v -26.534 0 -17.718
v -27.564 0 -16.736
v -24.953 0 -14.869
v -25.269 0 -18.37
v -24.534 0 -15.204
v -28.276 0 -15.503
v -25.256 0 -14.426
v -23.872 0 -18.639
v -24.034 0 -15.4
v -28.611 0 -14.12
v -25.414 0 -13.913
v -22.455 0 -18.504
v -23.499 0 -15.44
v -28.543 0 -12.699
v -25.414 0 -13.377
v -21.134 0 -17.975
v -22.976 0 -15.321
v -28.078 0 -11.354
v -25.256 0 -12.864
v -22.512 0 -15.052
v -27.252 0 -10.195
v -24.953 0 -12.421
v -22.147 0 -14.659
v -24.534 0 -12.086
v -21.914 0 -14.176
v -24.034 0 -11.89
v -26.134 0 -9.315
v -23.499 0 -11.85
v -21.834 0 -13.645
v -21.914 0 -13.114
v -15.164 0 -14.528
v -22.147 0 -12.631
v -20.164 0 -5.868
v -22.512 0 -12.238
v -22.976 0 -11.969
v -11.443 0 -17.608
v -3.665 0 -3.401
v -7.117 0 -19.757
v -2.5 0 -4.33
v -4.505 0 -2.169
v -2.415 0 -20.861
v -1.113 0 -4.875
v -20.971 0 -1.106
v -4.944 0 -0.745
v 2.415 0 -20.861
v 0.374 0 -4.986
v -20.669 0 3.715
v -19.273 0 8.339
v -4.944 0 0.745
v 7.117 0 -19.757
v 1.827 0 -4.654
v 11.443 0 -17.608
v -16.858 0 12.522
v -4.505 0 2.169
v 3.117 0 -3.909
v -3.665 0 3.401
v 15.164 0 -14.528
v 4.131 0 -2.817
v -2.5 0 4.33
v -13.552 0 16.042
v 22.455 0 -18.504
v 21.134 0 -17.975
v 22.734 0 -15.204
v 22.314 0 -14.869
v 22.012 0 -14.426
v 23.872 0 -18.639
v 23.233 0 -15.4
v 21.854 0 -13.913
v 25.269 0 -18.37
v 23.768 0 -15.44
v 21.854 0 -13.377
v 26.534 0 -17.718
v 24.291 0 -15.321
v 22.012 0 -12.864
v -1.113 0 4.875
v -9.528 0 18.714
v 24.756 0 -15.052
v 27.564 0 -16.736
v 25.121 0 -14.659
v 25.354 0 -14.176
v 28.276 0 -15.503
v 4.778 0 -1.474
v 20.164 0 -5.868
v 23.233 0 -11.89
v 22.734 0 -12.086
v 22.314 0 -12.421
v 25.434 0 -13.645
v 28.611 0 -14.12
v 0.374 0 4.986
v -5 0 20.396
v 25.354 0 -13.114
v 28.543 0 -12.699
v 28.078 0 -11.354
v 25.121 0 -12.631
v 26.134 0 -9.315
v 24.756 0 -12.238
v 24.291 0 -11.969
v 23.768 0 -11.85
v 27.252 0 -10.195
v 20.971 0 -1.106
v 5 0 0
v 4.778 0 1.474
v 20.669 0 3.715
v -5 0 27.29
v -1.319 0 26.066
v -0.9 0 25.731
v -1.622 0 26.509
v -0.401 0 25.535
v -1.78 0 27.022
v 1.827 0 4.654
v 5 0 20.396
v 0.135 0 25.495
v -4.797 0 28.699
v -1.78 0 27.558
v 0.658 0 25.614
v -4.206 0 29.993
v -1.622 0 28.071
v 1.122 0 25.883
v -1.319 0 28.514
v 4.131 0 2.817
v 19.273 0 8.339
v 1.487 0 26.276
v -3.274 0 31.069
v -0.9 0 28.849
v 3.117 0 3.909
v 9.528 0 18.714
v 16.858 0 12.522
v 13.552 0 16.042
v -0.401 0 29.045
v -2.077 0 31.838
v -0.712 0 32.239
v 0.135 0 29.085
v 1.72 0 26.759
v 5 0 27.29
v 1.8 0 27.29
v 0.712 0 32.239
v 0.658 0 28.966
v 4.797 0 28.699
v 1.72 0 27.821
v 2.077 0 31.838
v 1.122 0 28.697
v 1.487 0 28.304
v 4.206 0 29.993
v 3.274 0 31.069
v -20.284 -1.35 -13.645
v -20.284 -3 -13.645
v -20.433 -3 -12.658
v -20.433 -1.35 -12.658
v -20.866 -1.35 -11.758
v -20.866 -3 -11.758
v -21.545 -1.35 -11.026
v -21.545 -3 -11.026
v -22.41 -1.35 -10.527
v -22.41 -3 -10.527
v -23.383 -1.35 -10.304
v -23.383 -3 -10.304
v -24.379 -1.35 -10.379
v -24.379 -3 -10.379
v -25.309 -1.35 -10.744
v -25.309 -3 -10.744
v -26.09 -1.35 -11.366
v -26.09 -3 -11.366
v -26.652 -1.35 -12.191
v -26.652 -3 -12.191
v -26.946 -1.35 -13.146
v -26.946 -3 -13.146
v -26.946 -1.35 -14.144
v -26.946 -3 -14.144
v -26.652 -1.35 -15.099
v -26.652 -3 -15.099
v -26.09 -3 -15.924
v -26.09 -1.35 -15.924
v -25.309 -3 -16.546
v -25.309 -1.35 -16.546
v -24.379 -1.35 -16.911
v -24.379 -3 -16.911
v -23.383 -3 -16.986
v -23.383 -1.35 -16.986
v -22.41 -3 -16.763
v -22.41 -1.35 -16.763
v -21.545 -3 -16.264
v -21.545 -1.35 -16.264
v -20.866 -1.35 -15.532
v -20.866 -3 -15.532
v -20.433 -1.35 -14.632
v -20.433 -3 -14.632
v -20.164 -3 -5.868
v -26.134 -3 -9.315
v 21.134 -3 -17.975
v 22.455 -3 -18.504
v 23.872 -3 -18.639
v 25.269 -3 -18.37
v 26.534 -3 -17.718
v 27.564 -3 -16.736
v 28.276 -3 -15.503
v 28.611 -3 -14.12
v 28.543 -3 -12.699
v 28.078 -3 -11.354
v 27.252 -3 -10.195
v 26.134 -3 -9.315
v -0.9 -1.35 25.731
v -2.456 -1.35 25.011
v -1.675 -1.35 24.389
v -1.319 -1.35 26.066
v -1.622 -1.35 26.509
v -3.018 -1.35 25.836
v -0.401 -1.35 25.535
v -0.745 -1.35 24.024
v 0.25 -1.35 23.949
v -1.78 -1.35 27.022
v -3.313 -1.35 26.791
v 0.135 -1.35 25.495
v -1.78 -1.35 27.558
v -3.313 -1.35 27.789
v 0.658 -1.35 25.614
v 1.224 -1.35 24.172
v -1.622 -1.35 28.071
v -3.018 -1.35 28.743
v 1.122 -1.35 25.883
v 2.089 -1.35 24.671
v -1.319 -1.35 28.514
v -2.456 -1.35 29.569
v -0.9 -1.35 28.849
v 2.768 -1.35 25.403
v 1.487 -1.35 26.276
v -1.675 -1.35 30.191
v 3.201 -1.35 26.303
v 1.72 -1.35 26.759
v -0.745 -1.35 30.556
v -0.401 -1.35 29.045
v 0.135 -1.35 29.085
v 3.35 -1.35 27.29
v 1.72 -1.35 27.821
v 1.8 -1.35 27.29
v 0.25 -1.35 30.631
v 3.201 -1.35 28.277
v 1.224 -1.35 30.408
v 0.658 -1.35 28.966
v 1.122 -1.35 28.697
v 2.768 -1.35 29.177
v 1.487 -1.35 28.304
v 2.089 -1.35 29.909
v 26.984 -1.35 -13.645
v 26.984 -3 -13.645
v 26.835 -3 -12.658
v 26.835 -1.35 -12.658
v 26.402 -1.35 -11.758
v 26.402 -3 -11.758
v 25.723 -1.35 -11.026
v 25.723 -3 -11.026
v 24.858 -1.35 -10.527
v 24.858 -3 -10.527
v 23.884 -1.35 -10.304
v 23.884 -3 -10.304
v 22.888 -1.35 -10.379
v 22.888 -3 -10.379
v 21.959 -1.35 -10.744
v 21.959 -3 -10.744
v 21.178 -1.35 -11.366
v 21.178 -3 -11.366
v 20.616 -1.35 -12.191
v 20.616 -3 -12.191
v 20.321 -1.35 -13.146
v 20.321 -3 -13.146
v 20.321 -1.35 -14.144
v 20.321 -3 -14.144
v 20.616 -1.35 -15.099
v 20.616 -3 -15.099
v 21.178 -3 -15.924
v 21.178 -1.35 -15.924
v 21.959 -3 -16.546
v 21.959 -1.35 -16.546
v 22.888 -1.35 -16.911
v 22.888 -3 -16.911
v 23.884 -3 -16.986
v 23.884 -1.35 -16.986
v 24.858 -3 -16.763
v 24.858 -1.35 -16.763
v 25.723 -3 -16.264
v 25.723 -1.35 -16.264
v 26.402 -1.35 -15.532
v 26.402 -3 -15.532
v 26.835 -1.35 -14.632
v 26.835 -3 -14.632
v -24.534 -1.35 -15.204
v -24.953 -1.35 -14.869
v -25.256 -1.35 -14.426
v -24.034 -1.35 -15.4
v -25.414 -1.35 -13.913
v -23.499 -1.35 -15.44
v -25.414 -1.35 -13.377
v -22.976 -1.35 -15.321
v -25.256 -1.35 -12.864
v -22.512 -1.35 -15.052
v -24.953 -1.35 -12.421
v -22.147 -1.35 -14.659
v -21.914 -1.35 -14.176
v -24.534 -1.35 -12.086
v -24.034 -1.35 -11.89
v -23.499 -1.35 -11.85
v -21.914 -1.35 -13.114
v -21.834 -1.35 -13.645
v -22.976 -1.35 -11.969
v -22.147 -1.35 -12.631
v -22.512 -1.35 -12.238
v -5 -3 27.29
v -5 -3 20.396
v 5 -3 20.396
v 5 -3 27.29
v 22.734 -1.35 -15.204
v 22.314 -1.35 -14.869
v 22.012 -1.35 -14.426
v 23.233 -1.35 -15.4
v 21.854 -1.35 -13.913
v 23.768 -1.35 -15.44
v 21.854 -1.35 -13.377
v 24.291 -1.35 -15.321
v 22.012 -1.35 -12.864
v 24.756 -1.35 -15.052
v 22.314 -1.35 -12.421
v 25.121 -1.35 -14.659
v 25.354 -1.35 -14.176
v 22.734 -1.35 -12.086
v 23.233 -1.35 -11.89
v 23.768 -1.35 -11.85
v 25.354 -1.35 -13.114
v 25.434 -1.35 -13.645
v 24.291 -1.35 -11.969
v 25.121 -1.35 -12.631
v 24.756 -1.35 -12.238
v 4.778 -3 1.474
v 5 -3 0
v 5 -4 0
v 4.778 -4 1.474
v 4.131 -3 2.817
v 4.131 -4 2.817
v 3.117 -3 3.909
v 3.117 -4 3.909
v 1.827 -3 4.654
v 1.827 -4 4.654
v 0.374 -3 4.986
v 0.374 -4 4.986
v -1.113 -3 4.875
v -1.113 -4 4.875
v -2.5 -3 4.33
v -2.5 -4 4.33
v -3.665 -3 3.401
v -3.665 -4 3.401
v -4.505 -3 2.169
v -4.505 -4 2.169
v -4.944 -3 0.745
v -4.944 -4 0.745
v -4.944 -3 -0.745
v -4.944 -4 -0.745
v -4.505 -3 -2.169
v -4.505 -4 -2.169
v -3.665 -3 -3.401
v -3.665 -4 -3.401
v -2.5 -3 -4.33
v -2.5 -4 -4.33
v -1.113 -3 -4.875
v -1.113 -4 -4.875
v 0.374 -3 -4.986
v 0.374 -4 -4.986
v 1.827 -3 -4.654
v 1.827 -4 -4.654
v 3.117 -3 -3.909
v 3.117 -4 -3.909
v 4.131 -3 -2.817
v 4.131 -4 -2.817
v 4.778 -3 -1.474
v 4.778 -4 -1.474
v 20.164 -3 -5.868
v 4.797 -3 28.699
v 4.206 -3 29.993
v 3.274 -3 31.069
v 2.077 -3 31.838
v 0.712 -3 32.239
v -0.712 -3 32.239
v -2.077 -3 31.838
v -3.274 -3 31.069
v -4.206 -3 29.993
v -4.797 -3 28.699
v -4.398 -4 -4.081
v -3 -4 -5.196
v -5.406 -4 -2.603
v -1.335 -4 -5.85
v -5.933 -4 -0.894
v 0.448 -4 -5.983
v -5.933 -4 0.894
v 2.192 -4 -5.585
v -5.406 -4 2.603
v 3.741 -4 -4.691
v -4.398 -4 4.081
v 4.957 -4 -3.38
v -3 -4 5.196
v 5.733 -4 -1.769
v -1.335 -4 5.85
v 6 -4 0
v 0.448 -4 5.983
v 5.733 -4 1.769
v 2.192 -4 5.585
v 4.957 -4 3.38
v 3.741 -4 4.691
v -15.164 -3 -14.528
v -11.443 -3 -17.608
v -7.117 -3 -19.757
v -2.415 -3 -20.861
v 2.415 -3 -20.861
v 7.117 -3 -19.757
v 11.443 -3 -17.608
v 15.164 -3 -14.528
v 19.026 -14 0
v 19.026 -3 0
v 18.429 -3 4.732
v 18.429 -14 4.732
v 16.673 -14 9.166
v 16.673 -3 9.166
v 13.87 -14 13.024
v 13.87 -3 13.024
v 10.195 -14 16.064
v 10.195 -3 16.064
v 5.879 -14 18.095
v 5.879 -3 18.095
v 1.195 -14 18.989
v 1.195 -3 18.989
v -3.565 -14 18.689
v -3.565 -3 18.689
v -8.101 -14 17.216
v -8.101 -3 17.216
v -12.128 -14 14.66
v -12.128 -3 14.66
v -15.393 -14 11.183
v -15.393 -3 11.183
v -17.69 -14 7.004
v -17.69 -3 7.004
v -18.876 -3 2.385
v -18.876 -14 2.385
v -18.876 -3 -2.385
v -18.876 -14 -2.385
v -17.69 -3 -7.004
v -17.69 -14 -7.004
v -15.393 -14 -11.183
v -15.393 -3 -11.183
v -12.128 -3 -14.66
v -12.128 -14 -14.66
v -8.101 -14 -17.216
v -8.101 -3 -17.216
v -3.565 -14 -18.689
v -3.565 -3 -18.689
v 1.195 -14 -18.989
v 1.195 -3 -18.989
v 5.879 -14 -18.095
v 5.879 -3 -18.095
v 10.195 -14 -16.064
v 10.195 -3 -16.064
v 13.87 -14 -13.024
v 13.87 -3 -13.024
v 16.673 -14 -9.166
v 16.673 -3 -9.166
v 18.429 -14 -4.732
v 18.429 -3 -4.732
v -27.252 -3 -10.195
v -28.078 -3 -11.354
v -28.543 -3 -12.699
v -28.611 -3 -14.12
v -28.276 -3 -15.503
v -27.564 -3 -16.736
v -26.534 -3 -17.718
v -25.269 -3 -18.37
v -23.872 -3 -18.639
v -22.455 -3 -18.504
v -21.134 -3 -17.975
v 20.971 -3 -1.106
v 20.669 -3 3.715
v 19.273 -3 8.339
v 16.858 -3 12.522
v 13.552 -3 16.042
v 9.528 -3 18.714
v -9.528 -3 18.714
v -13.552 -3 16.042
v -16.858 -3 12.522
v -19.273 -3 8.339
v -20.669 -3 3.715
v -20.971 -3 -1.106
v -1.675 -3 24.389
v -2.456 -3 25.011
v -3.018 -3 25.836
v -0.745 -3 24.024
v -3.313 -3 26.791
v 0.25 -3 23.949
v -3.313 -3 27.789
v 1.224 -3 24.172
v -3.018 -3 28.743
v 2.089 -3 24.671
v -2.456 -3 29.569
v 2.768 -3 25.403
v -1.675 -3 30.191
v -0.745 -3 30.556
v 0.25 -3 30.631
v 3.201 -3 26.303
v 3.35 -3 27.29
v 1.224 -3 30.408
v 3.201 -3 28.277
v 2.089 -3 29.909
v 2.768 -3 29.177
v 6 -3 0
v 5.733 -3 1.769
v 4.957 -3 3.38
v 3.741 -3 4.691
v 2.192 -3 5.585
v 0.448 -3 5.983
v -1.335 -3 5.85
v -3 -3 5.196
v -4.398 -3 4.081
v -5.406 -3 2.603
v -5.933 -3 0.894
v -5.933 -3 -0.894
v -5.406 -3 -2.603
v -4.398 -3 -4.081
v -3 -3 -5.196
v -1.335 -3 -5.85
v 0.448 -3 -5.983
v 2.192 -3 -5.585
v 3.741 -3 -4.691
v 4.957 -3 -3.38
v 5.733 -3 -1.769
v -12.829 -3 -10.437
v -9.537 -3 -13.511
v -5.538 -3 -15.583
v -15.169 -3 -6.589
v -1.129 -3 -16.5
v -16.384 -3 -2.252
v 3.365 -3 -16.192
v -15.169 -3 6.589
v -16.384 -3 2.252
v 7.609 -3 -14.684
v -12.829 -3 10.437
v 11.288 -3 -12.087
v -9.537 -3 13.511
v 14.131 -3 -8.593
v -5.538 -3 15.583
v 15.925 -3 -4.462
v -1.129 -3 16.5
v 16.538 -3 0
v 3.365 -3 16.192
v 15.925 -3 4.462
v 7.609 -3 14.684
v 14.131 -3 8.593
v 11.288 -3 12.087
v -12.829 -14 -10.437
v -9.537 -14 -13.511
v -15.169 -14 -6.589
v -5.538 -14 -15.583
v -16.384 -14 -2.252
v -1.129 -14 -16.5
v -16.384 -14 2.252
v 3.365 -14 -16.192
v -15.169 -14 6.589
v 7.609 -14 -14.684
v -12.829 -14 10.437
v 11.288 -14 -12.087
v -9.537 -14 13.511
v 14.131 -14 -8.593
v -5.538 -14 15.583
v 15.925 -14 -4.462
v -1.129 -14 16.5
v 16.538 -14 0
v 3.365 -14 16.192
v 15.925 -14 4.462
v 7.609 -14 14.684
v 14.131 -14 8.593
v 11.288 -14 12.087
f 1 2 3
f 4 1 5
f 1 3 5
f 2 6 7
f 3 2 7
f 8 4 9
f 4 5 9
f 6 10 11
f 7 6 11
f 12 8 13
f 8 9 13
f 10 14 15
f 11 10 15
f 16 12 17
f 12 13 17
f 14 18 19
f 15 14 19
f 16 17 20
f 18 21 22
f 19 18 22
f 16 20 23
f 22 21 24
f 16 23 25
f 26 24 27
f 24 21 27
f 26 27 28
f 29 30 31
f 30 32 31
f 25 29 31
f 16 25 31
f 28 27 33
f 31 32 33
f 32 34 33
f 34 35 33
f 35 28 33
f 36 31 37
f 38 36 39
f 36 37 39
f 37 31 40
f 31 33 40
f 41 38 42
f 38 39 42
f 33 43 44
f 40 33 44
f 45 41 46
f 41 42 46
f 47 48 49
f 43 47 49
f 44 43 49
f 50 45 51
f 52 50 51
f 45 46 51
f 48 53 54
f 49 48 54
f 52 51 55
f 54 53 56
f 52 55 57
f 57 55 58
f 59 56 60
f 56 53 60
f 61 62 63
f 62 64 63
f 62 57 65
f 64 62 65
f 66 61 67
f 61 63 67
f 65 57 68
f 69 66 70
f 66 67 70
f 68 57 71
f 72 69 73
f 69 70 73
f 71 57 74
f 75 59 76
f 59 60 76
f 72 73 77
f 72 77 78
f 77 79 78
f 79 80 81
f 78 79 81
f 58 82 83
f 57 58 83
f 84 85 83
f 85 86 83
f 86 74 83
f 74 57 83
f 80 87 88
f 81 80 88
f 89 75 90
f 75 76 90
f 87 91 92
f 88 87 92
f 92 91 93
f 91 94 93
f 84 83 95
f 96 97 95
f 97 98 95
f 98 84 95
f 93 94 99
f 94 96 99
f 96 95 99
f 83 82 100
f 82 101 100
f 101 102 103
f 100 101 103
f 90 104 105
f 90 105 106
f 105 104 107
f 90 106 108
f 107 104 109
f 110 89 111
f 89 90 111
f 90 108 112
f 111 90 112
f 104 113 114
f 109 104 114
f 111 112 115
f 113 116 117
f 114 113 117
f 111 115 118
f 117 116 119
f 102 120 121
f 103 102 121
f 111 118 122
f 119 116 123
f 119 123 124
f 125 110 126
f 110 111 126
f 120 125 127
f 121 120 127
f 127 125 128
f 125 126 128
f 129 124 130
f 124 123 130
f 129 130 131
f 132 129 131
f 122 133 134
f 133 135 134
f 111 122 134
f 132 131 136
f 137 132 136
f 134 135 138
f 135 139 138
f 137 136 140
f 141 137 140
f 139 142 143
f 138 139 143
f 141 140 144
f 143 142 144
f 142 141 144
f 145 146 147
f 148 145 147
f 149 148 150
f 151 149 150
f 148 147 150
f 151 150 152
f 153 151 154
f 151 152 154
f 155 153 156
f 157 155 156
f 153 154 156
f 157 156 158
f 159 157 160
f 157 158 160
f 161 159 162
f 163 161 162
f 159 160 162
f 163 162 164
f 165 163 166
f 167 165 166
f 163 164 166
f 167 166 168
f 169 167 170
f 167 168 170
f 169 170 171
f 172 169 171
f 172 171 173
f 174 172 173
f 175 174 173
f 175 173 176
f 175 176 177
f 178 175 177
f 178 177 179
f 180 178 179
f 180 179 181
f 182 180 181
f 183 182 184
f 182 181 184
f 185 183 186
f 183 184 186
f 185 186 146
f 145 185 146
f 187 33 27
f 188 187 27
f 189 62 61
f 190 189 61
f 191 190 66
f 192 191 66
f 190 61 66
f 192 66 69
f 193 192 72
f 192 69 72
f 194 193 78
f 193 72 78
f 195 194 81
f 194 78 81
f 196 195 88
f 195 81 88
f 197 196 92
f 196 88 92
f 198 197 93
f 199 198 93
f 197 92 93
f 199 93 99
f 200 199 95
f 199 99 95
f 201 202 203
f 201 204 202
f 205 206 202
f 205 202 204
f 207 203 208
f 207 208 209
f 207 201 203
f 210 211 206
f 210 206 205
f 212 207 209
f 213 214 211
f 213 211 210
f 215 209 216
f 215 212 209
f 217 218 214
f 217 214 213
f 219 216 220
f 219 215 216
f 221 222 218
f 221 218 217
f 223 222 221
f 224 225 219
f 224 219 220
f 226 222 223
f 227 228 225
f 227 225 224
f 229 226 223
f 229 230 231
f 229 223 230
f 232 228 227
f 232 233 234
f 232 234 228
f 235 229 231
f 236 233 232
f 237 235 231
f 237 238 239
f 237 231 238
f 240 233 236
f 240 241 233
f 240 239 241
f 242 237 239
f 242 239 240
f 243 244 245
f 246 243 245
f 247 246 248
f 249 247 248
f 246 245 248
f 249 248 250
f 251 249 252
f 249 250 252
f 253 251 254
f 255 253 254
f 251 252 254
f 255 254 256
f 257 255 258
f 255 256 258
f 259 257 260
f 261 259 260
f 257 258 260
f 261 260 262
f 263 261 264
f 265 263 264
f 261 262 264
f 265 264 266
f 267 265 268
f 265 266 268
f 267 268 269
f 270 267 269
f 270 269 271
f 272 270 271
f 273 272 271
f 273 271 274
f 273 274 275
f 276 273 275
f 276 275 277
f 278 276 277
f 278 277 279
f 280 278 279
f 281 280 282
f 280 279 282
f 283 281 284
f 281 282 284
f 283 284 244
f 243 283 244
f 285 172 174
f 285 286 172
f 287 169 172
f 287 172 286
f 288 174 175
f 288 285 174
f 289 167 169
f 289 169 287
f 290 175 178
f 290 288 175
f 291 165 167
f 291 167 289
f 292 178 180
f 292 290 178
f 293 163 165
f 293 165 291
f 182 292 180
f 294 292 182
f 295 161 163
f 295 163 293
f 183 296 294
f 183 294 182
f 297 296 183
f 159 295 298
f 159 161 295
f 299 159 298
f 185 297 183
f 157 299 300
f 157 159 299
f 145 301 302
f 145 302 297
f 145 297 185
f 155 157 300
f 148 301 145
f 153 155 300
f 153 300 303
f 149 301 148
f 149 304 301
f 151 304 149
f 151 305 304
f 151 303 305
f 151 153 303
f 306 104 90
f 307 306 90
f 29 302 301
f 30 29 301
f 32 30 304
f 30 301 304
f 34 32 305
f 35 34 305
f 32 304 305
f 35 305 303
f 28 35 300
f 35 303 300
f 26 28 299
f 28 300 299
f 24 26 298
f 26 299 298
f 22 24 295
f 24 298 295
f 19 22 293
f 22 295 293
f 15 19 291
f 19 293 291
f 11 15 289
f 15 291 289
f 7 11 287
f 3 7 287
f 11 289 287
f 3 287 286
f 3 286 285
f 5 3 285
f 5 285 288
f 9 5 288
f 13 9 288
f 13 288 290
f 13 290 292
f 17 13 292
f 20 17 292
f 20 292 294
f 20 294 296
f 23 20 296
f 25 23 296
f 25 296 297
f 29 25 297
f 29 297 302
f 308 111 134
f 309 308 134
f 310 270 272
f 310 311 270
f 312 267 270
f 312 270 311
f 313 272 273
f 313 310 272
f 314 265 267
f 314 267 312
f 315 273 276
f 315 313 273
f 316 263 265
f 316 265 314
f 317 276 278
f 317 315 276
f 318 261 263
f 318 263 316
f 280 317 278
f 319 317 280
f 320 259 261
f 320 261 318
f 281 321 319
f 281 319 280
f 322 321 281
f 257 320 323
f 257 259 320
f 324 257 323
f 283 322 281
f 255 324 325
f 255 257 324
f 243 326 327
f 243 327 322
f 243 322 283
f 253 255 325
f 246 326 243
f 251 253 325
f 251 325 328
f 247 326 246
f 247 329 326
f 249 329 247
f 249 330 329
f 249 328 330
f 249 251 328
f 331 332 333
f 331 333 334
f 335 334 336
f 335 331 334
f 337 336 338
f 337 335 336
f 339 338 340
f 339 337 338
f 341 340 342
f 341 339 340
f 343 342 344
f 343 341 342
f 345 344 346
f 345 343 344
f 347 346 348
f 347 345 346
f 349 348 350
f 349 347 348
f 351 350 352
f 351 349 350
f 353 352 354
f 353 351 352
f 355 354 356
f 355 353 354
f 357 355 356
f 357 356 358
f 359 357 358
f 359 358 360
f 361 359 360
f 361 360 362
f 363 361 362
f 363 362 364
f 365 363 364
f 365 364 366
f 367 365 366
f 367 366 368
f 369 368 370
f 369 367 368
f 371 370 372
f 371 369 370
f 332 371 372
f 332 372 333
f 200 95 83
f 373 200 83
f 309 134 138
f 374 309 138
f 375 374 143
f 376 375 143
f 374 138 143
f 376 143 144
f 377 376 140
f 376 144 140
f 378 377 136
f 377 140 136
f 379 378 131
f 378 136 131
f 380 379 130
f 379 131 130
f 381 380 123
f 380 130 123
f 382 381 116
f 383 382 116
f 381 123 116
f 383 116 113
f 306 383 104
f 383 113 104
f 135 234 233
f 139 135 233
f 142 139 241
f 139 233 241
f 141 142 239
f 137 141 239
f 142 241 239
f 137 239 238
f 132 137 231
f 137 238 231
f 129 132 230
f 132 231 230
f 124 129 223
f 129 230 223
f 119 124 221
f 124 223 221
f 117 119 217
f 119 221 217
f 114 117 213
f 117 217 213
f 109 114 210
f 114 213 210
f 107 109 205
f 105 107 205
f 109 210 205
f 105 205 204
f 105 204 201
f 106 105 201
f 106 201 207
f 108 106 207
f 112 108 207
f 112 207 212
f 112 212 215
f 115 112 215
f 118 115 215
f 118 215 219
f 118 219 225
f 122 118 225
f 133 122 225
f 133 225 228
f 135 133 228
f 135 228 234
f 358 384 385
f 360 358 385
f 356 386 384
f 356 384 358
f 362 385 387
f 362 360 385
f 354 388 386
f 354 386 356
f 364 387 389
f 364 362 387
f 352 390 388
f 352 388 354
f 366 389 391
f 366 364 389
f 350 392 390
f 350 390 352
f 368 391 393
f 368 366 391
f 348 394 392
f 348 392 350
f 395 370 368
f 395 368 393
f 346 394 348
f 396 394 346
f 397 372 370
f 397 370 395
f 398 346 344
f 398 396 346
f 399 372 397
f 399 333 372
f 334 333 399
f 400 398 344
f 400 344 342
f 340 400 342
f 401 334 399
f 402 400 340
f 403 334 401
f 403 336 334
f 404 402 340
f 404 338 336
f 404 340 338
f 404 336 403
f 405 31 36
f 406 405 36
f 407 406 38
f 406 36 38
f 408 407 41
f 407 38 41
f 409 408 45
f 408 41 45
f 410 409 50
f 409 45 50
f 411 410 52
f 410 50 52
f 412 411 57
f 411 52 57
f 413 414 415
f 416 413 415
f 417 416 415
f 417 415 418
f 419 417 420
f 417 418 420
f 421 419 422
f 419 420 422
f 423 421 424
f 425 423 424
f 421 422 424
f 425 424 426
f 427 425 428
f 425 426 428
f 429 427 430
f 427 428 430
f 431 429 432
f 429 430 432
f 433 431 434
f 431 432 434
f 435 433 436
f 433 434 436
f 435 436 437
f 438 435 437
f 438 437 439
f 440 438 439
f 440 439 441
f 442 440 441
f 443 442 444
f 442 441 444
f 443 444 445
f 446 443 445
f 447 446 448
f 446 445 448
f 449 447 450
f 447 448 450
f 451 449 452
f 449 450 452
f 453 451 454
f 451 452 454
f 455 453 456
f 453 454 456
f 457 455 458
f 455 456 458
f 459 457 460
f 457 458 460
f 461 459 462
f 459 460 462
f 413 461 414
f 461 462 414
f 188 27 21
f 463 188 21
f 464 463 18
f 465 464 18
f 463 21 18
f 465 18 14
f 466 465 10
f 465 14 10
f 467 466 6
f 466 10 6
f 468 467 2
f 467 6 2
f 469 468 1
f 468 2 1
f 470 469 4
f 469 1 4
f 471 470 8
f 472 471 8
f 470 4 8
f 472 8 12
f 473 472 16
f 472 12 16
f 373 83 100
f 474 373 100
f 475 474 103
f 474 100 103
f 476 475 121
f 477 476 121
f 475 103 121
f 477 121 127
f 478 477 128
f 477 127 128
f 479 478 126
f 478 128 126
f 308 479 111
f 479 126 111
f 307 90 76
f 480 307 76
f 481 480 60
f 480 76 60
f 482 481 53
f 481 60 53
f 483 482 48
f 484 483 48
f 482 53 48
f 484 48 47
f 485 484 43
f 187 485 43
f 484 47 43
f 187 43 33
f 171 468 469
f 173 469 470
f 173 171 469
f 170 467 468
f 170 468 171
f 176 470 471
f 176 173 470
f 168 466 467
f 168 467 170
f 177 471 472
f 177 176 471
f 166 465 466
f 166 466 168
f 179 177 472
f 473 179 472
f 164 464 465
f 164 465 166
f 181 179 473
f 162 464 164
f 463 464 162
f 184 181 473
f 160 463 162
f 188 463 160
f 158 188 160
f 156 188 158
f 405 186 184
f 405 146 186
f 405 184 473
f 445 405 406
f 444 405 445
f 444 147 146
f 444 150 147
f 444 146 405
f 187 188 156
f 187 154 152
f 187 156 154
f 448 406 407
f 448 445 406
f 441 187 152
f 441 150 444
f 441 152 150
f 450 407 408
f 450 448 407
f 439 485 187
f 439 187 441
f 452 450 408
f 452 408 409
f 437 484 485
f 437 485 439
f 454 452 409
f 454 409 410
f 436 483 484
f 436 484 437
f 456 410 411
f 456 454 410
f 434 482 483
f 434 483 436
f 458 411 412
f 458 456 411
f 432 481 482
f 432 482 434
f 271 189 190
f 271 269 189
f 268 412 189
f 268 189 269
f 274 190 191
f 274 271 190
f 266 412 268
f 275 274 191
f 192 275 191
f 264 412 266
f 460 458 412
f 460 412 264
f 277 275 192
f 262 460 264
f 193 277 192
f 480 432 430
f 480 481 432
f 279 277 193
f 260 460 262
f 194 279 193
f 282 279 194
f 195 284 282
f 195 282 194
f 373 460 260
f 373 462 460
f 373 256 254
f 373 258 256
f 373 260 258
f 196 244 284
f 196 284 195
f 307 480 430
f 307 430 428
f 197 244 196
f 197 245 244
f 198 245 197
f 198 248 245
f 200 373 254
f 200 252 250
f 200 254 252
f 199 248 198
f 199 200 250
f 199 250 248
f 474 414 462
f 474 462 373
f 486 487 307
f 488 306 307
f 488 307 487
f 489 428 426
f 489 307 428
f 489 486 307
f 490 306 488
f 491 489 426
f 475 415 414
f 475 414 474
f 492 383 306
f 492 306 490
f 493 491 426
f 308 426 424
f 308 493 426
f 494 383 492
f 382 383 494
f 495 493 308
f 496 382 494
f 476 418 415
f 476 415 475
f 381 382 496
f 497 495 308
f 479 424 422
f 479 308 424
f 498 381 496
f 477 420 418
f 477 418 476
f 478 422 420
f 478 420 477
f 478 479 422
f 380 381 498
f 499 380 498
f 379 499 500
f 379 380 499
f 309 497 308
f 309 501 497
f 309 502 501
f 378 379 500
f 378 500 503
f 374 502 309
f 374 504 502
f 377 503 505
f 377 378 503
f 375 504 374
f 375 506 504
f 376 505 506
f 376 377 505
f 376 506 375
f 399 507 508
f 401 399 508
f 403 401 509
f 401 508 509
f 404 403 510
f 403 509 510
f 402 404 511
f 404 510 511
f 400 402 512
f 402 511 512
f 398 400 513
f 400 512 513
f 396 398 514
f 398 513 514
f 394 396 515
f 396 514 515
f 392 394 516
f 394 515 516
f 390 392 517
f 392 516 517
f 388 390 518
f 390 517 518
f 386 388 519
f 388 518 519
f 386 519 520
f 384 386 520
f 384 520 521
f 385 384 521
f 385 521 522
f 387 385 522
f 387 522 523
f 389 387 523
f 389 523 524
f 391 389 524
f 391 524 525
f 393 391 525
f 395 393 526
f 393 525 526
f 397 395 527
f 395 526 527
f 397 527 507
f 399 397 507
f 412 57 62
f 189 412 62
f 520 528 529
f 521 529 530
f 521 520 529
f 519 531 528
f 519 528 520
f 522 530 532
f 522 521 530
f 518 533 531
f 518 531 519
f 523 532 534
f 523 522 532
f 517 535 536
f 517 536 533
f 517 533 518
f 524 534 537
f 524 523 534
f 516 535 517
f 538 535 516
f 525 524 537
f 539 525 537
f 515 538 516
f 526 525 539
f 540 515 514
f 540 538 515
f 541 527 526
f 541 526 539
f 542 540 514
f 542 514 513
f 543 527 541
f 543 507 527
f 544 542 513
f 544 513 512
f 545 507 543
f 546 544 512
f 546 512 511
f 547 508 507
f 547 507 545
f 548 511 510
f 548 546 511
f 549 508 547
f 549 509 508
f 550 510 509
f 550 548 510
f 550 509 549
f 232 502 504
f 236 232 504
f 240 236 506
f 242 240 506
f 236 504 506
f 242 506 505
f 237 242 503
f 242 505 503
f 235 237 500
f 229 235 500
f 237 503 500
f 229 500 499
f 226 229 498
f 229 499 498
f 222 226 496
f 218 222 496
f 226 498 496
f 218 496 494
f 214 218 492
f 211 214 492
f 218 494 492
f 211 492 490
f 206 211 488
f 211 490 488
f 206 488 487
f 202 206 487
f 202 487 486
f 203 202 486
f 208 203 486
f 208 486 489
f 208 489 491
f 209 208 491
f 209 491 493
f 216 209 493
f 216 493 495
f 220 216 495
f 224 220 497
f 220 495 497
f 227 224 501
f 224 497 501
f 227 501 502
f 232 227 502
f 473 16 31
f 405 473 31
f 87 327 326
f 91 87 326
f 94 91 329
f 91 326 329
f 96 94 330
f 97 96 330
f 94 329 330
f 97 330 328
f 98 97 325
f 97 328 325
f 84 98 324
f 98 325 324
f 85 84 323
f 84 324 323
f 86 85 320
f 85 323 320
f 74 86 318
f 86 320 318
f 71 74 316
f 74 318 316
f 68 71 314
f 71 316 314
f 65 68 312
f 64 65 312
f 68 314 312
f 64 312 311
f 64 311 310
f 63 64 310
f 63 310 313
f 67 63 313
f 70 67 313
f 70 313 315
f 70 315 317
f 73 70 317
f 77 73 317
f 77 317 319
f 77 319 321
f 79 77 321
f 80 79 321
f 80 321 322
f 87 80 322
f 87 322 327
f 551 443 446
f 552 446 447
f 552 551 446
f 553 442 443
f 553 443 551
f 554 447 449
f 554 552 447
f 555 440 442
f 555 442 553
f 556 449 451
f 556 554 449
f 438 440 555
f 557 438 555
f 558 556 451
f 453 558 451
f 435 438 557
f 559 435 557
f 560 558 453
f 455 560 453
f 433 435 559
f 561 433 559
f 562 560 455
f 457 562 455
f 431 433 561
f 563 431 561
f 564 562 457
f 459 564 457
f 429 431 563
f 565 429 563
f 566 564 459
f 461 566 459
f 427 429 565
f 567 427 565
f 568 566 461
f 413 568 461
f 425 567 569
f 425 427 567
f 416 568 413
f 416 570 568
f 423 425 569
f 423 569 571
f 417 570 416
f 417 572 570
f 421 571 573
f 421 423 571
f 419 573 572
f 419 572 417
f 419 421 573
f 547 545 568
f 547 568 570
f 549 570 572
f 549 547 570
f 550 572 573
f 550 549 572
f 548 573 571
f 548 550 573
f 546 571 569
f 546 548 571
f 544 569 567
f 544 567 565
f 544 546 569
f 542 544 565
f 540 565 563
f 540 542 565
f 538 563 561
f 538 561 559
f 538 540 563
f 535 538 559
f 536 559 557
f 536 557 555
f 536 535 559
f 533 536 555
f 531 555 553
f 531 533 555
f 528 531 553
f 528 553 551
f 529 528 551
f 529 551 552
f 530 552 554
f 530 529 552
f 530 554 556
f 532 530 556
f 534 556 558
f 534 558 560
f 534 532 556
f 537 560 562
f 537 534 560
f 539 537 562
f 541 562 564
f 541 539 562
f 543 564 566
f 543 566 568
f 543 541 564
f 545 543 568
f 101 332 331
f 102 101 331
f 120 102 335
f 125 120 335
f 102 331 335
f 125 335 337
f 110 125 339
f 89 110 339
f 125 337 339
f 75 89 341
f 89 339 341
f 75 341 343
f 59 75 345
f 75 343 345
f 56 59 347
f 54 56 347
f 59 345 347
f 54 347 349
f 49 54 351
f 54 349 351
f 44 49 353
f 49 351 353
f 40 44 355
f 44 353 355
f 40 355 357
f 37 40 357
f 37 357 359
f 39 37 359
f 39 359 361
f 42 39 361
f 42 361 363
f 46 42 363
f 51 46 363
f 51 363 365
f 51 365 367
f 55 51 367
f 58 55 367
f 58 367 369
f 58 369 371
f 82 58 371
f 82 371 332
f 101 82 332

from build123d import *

# Parameters (mm, degrees)
F1_DEPTH  = 3
F2_R      = 19.0263418025
F2_R_2    = 16.5382084955
F3_DEPTH  = 11
F4_R      = 5
F5_DEPTH  = 3.001
F7_R      = 1.8
F8_DEPTH  = 3.001
F6_R      = 6
F6_R_2    = 5
F9_DEPTH  = 1
F10_R     = 3.35
F10_R_2   = 1.8
F11_DEPTH = 1.65
F12_R     = 3.35
F12_R_2   = 1.8
F13_DEPTH = 1.65


with BuildPart() as f1:
    # F0 (on Front) → F1 (new body)
    with BuildSketch(Plane.XZ):
        with BuildLine():
            Line((-5, 27.2899847478), (-5, 20.3960780544))
            ThreePointArc((-5, 20.3960780544), (-18.1865334795, 10.5), (-20.1635217327, -5.8679120083))
            Line((-20.1635217327, -5.8679120083), (-26.1338200605, -9.314865355))
            ThreePointArc((-26.1338200605, -9.314865355), (-27.9639470794, -16.1449923739), (-21.1338200605, -17.9751193928))
            Line((-21.1338200605, -17.9751193928), (-15.1635217327, -14.5281660461))
            ThreePointArc((-15.1635217327, -14.5281660461), (0, -21), (15.1635217327, -14.5281660461))
            Line((15.1635217327, -14.5281660461), (21.1338200605, -17.9751193928))
            ThreePointArc((21.1338200605, -17.9751193928), (27.9639470794, -16.1449923739), (26.1338200605, -9.314865355))
            Line((26.1338200605, -9.314865355), (20.1635217327, -5.8679120083))
            ThreePointArc((20.1635217327, -5.8679120083), (18.1865334795, 10.5), (5, 20.3960780544))
            Line((5, 20.3960780544), (5, 27.2899847478))
            ThreePointArc((5, 27.2899847478), (0, 32.2899847478), (-5, 27.2899847478))
        make_face()
    extrude(amount=F1_DEPTH)

    # F2 (on face) → F3 (join)
    with BuildSketch(Plane.XZ.offset(3)):
        Circle(F2_R)
        Circle(F2_R_2, mode=Mode.SUBTRACT)
    extrude(amount=F3_DEPTH)

    # F4 (on face) → F5 (cut, through all)
    with BuildSketch(Plane.XZ.offset(3)):
        Circle(F4_R)
    extrude(amount=-F5_DEPTH, mode=Mode.SUBTRACT)

    # F7 (on face) → F8 (cut, through all)
    with BuildSketch(Plane.XZ.offset(3)):
        with Locations((-23.6338200605, -13.6449923739)):
            Circle(F7_R)
        with Locations((23.6338200605, -13.6449923739)):
            Circle(F7_R)
        with Locations((0, 27.2899847478)):
            Circle(F7_R)
    extrude(amount=-F8_DEPTH, mode=Mode.SUBTRACT)

    # F6 (on face) → F9 (join)
    with BuildSketch(Plane.XZ.offset(3)):
        Circle(F6_R)
        Circle(F6_R_2, mode=Mode.SUBTRACT)
    extrude(amount=F9_DEPTH)

    # F10 (on face) → F11 (cut)
    with BuildSketch(Plane.XZ.offset(3)):
        with Locations((0, 27.2899847478)):
            Circle(F10_R)
        with Locations((0, 27.2899847478)):
            Circle(F10_R_2, mode=Mode.SUBTRACT)
    extrude(amount=-F11_DEPTH, mode=Mode.SUBTRACT)

    # F12 (on face) → F13 (cut)
    with BuildSketch(Plane.XZ.offset(3)):
        with Locations((23.6338200605, -13.6449923739)):
            Circle(F12_R)
        with Locations((23.6338200605, -13.6449923739)):
            Circle(F12_R_2, mode=Mode.SUBTRACT)
        with Locations((-23.6338200605, -13.6449923739)):
            Circle(F12_R)
        with Locations((-23.6338200605, -13.6449923739)):
            Circle(F12_R_2, mode=Mode.SUBTRACT)
    extrude(amount=-F13_DEPTH, mode=Mode.SUBTRACT)


solid = f1.part
